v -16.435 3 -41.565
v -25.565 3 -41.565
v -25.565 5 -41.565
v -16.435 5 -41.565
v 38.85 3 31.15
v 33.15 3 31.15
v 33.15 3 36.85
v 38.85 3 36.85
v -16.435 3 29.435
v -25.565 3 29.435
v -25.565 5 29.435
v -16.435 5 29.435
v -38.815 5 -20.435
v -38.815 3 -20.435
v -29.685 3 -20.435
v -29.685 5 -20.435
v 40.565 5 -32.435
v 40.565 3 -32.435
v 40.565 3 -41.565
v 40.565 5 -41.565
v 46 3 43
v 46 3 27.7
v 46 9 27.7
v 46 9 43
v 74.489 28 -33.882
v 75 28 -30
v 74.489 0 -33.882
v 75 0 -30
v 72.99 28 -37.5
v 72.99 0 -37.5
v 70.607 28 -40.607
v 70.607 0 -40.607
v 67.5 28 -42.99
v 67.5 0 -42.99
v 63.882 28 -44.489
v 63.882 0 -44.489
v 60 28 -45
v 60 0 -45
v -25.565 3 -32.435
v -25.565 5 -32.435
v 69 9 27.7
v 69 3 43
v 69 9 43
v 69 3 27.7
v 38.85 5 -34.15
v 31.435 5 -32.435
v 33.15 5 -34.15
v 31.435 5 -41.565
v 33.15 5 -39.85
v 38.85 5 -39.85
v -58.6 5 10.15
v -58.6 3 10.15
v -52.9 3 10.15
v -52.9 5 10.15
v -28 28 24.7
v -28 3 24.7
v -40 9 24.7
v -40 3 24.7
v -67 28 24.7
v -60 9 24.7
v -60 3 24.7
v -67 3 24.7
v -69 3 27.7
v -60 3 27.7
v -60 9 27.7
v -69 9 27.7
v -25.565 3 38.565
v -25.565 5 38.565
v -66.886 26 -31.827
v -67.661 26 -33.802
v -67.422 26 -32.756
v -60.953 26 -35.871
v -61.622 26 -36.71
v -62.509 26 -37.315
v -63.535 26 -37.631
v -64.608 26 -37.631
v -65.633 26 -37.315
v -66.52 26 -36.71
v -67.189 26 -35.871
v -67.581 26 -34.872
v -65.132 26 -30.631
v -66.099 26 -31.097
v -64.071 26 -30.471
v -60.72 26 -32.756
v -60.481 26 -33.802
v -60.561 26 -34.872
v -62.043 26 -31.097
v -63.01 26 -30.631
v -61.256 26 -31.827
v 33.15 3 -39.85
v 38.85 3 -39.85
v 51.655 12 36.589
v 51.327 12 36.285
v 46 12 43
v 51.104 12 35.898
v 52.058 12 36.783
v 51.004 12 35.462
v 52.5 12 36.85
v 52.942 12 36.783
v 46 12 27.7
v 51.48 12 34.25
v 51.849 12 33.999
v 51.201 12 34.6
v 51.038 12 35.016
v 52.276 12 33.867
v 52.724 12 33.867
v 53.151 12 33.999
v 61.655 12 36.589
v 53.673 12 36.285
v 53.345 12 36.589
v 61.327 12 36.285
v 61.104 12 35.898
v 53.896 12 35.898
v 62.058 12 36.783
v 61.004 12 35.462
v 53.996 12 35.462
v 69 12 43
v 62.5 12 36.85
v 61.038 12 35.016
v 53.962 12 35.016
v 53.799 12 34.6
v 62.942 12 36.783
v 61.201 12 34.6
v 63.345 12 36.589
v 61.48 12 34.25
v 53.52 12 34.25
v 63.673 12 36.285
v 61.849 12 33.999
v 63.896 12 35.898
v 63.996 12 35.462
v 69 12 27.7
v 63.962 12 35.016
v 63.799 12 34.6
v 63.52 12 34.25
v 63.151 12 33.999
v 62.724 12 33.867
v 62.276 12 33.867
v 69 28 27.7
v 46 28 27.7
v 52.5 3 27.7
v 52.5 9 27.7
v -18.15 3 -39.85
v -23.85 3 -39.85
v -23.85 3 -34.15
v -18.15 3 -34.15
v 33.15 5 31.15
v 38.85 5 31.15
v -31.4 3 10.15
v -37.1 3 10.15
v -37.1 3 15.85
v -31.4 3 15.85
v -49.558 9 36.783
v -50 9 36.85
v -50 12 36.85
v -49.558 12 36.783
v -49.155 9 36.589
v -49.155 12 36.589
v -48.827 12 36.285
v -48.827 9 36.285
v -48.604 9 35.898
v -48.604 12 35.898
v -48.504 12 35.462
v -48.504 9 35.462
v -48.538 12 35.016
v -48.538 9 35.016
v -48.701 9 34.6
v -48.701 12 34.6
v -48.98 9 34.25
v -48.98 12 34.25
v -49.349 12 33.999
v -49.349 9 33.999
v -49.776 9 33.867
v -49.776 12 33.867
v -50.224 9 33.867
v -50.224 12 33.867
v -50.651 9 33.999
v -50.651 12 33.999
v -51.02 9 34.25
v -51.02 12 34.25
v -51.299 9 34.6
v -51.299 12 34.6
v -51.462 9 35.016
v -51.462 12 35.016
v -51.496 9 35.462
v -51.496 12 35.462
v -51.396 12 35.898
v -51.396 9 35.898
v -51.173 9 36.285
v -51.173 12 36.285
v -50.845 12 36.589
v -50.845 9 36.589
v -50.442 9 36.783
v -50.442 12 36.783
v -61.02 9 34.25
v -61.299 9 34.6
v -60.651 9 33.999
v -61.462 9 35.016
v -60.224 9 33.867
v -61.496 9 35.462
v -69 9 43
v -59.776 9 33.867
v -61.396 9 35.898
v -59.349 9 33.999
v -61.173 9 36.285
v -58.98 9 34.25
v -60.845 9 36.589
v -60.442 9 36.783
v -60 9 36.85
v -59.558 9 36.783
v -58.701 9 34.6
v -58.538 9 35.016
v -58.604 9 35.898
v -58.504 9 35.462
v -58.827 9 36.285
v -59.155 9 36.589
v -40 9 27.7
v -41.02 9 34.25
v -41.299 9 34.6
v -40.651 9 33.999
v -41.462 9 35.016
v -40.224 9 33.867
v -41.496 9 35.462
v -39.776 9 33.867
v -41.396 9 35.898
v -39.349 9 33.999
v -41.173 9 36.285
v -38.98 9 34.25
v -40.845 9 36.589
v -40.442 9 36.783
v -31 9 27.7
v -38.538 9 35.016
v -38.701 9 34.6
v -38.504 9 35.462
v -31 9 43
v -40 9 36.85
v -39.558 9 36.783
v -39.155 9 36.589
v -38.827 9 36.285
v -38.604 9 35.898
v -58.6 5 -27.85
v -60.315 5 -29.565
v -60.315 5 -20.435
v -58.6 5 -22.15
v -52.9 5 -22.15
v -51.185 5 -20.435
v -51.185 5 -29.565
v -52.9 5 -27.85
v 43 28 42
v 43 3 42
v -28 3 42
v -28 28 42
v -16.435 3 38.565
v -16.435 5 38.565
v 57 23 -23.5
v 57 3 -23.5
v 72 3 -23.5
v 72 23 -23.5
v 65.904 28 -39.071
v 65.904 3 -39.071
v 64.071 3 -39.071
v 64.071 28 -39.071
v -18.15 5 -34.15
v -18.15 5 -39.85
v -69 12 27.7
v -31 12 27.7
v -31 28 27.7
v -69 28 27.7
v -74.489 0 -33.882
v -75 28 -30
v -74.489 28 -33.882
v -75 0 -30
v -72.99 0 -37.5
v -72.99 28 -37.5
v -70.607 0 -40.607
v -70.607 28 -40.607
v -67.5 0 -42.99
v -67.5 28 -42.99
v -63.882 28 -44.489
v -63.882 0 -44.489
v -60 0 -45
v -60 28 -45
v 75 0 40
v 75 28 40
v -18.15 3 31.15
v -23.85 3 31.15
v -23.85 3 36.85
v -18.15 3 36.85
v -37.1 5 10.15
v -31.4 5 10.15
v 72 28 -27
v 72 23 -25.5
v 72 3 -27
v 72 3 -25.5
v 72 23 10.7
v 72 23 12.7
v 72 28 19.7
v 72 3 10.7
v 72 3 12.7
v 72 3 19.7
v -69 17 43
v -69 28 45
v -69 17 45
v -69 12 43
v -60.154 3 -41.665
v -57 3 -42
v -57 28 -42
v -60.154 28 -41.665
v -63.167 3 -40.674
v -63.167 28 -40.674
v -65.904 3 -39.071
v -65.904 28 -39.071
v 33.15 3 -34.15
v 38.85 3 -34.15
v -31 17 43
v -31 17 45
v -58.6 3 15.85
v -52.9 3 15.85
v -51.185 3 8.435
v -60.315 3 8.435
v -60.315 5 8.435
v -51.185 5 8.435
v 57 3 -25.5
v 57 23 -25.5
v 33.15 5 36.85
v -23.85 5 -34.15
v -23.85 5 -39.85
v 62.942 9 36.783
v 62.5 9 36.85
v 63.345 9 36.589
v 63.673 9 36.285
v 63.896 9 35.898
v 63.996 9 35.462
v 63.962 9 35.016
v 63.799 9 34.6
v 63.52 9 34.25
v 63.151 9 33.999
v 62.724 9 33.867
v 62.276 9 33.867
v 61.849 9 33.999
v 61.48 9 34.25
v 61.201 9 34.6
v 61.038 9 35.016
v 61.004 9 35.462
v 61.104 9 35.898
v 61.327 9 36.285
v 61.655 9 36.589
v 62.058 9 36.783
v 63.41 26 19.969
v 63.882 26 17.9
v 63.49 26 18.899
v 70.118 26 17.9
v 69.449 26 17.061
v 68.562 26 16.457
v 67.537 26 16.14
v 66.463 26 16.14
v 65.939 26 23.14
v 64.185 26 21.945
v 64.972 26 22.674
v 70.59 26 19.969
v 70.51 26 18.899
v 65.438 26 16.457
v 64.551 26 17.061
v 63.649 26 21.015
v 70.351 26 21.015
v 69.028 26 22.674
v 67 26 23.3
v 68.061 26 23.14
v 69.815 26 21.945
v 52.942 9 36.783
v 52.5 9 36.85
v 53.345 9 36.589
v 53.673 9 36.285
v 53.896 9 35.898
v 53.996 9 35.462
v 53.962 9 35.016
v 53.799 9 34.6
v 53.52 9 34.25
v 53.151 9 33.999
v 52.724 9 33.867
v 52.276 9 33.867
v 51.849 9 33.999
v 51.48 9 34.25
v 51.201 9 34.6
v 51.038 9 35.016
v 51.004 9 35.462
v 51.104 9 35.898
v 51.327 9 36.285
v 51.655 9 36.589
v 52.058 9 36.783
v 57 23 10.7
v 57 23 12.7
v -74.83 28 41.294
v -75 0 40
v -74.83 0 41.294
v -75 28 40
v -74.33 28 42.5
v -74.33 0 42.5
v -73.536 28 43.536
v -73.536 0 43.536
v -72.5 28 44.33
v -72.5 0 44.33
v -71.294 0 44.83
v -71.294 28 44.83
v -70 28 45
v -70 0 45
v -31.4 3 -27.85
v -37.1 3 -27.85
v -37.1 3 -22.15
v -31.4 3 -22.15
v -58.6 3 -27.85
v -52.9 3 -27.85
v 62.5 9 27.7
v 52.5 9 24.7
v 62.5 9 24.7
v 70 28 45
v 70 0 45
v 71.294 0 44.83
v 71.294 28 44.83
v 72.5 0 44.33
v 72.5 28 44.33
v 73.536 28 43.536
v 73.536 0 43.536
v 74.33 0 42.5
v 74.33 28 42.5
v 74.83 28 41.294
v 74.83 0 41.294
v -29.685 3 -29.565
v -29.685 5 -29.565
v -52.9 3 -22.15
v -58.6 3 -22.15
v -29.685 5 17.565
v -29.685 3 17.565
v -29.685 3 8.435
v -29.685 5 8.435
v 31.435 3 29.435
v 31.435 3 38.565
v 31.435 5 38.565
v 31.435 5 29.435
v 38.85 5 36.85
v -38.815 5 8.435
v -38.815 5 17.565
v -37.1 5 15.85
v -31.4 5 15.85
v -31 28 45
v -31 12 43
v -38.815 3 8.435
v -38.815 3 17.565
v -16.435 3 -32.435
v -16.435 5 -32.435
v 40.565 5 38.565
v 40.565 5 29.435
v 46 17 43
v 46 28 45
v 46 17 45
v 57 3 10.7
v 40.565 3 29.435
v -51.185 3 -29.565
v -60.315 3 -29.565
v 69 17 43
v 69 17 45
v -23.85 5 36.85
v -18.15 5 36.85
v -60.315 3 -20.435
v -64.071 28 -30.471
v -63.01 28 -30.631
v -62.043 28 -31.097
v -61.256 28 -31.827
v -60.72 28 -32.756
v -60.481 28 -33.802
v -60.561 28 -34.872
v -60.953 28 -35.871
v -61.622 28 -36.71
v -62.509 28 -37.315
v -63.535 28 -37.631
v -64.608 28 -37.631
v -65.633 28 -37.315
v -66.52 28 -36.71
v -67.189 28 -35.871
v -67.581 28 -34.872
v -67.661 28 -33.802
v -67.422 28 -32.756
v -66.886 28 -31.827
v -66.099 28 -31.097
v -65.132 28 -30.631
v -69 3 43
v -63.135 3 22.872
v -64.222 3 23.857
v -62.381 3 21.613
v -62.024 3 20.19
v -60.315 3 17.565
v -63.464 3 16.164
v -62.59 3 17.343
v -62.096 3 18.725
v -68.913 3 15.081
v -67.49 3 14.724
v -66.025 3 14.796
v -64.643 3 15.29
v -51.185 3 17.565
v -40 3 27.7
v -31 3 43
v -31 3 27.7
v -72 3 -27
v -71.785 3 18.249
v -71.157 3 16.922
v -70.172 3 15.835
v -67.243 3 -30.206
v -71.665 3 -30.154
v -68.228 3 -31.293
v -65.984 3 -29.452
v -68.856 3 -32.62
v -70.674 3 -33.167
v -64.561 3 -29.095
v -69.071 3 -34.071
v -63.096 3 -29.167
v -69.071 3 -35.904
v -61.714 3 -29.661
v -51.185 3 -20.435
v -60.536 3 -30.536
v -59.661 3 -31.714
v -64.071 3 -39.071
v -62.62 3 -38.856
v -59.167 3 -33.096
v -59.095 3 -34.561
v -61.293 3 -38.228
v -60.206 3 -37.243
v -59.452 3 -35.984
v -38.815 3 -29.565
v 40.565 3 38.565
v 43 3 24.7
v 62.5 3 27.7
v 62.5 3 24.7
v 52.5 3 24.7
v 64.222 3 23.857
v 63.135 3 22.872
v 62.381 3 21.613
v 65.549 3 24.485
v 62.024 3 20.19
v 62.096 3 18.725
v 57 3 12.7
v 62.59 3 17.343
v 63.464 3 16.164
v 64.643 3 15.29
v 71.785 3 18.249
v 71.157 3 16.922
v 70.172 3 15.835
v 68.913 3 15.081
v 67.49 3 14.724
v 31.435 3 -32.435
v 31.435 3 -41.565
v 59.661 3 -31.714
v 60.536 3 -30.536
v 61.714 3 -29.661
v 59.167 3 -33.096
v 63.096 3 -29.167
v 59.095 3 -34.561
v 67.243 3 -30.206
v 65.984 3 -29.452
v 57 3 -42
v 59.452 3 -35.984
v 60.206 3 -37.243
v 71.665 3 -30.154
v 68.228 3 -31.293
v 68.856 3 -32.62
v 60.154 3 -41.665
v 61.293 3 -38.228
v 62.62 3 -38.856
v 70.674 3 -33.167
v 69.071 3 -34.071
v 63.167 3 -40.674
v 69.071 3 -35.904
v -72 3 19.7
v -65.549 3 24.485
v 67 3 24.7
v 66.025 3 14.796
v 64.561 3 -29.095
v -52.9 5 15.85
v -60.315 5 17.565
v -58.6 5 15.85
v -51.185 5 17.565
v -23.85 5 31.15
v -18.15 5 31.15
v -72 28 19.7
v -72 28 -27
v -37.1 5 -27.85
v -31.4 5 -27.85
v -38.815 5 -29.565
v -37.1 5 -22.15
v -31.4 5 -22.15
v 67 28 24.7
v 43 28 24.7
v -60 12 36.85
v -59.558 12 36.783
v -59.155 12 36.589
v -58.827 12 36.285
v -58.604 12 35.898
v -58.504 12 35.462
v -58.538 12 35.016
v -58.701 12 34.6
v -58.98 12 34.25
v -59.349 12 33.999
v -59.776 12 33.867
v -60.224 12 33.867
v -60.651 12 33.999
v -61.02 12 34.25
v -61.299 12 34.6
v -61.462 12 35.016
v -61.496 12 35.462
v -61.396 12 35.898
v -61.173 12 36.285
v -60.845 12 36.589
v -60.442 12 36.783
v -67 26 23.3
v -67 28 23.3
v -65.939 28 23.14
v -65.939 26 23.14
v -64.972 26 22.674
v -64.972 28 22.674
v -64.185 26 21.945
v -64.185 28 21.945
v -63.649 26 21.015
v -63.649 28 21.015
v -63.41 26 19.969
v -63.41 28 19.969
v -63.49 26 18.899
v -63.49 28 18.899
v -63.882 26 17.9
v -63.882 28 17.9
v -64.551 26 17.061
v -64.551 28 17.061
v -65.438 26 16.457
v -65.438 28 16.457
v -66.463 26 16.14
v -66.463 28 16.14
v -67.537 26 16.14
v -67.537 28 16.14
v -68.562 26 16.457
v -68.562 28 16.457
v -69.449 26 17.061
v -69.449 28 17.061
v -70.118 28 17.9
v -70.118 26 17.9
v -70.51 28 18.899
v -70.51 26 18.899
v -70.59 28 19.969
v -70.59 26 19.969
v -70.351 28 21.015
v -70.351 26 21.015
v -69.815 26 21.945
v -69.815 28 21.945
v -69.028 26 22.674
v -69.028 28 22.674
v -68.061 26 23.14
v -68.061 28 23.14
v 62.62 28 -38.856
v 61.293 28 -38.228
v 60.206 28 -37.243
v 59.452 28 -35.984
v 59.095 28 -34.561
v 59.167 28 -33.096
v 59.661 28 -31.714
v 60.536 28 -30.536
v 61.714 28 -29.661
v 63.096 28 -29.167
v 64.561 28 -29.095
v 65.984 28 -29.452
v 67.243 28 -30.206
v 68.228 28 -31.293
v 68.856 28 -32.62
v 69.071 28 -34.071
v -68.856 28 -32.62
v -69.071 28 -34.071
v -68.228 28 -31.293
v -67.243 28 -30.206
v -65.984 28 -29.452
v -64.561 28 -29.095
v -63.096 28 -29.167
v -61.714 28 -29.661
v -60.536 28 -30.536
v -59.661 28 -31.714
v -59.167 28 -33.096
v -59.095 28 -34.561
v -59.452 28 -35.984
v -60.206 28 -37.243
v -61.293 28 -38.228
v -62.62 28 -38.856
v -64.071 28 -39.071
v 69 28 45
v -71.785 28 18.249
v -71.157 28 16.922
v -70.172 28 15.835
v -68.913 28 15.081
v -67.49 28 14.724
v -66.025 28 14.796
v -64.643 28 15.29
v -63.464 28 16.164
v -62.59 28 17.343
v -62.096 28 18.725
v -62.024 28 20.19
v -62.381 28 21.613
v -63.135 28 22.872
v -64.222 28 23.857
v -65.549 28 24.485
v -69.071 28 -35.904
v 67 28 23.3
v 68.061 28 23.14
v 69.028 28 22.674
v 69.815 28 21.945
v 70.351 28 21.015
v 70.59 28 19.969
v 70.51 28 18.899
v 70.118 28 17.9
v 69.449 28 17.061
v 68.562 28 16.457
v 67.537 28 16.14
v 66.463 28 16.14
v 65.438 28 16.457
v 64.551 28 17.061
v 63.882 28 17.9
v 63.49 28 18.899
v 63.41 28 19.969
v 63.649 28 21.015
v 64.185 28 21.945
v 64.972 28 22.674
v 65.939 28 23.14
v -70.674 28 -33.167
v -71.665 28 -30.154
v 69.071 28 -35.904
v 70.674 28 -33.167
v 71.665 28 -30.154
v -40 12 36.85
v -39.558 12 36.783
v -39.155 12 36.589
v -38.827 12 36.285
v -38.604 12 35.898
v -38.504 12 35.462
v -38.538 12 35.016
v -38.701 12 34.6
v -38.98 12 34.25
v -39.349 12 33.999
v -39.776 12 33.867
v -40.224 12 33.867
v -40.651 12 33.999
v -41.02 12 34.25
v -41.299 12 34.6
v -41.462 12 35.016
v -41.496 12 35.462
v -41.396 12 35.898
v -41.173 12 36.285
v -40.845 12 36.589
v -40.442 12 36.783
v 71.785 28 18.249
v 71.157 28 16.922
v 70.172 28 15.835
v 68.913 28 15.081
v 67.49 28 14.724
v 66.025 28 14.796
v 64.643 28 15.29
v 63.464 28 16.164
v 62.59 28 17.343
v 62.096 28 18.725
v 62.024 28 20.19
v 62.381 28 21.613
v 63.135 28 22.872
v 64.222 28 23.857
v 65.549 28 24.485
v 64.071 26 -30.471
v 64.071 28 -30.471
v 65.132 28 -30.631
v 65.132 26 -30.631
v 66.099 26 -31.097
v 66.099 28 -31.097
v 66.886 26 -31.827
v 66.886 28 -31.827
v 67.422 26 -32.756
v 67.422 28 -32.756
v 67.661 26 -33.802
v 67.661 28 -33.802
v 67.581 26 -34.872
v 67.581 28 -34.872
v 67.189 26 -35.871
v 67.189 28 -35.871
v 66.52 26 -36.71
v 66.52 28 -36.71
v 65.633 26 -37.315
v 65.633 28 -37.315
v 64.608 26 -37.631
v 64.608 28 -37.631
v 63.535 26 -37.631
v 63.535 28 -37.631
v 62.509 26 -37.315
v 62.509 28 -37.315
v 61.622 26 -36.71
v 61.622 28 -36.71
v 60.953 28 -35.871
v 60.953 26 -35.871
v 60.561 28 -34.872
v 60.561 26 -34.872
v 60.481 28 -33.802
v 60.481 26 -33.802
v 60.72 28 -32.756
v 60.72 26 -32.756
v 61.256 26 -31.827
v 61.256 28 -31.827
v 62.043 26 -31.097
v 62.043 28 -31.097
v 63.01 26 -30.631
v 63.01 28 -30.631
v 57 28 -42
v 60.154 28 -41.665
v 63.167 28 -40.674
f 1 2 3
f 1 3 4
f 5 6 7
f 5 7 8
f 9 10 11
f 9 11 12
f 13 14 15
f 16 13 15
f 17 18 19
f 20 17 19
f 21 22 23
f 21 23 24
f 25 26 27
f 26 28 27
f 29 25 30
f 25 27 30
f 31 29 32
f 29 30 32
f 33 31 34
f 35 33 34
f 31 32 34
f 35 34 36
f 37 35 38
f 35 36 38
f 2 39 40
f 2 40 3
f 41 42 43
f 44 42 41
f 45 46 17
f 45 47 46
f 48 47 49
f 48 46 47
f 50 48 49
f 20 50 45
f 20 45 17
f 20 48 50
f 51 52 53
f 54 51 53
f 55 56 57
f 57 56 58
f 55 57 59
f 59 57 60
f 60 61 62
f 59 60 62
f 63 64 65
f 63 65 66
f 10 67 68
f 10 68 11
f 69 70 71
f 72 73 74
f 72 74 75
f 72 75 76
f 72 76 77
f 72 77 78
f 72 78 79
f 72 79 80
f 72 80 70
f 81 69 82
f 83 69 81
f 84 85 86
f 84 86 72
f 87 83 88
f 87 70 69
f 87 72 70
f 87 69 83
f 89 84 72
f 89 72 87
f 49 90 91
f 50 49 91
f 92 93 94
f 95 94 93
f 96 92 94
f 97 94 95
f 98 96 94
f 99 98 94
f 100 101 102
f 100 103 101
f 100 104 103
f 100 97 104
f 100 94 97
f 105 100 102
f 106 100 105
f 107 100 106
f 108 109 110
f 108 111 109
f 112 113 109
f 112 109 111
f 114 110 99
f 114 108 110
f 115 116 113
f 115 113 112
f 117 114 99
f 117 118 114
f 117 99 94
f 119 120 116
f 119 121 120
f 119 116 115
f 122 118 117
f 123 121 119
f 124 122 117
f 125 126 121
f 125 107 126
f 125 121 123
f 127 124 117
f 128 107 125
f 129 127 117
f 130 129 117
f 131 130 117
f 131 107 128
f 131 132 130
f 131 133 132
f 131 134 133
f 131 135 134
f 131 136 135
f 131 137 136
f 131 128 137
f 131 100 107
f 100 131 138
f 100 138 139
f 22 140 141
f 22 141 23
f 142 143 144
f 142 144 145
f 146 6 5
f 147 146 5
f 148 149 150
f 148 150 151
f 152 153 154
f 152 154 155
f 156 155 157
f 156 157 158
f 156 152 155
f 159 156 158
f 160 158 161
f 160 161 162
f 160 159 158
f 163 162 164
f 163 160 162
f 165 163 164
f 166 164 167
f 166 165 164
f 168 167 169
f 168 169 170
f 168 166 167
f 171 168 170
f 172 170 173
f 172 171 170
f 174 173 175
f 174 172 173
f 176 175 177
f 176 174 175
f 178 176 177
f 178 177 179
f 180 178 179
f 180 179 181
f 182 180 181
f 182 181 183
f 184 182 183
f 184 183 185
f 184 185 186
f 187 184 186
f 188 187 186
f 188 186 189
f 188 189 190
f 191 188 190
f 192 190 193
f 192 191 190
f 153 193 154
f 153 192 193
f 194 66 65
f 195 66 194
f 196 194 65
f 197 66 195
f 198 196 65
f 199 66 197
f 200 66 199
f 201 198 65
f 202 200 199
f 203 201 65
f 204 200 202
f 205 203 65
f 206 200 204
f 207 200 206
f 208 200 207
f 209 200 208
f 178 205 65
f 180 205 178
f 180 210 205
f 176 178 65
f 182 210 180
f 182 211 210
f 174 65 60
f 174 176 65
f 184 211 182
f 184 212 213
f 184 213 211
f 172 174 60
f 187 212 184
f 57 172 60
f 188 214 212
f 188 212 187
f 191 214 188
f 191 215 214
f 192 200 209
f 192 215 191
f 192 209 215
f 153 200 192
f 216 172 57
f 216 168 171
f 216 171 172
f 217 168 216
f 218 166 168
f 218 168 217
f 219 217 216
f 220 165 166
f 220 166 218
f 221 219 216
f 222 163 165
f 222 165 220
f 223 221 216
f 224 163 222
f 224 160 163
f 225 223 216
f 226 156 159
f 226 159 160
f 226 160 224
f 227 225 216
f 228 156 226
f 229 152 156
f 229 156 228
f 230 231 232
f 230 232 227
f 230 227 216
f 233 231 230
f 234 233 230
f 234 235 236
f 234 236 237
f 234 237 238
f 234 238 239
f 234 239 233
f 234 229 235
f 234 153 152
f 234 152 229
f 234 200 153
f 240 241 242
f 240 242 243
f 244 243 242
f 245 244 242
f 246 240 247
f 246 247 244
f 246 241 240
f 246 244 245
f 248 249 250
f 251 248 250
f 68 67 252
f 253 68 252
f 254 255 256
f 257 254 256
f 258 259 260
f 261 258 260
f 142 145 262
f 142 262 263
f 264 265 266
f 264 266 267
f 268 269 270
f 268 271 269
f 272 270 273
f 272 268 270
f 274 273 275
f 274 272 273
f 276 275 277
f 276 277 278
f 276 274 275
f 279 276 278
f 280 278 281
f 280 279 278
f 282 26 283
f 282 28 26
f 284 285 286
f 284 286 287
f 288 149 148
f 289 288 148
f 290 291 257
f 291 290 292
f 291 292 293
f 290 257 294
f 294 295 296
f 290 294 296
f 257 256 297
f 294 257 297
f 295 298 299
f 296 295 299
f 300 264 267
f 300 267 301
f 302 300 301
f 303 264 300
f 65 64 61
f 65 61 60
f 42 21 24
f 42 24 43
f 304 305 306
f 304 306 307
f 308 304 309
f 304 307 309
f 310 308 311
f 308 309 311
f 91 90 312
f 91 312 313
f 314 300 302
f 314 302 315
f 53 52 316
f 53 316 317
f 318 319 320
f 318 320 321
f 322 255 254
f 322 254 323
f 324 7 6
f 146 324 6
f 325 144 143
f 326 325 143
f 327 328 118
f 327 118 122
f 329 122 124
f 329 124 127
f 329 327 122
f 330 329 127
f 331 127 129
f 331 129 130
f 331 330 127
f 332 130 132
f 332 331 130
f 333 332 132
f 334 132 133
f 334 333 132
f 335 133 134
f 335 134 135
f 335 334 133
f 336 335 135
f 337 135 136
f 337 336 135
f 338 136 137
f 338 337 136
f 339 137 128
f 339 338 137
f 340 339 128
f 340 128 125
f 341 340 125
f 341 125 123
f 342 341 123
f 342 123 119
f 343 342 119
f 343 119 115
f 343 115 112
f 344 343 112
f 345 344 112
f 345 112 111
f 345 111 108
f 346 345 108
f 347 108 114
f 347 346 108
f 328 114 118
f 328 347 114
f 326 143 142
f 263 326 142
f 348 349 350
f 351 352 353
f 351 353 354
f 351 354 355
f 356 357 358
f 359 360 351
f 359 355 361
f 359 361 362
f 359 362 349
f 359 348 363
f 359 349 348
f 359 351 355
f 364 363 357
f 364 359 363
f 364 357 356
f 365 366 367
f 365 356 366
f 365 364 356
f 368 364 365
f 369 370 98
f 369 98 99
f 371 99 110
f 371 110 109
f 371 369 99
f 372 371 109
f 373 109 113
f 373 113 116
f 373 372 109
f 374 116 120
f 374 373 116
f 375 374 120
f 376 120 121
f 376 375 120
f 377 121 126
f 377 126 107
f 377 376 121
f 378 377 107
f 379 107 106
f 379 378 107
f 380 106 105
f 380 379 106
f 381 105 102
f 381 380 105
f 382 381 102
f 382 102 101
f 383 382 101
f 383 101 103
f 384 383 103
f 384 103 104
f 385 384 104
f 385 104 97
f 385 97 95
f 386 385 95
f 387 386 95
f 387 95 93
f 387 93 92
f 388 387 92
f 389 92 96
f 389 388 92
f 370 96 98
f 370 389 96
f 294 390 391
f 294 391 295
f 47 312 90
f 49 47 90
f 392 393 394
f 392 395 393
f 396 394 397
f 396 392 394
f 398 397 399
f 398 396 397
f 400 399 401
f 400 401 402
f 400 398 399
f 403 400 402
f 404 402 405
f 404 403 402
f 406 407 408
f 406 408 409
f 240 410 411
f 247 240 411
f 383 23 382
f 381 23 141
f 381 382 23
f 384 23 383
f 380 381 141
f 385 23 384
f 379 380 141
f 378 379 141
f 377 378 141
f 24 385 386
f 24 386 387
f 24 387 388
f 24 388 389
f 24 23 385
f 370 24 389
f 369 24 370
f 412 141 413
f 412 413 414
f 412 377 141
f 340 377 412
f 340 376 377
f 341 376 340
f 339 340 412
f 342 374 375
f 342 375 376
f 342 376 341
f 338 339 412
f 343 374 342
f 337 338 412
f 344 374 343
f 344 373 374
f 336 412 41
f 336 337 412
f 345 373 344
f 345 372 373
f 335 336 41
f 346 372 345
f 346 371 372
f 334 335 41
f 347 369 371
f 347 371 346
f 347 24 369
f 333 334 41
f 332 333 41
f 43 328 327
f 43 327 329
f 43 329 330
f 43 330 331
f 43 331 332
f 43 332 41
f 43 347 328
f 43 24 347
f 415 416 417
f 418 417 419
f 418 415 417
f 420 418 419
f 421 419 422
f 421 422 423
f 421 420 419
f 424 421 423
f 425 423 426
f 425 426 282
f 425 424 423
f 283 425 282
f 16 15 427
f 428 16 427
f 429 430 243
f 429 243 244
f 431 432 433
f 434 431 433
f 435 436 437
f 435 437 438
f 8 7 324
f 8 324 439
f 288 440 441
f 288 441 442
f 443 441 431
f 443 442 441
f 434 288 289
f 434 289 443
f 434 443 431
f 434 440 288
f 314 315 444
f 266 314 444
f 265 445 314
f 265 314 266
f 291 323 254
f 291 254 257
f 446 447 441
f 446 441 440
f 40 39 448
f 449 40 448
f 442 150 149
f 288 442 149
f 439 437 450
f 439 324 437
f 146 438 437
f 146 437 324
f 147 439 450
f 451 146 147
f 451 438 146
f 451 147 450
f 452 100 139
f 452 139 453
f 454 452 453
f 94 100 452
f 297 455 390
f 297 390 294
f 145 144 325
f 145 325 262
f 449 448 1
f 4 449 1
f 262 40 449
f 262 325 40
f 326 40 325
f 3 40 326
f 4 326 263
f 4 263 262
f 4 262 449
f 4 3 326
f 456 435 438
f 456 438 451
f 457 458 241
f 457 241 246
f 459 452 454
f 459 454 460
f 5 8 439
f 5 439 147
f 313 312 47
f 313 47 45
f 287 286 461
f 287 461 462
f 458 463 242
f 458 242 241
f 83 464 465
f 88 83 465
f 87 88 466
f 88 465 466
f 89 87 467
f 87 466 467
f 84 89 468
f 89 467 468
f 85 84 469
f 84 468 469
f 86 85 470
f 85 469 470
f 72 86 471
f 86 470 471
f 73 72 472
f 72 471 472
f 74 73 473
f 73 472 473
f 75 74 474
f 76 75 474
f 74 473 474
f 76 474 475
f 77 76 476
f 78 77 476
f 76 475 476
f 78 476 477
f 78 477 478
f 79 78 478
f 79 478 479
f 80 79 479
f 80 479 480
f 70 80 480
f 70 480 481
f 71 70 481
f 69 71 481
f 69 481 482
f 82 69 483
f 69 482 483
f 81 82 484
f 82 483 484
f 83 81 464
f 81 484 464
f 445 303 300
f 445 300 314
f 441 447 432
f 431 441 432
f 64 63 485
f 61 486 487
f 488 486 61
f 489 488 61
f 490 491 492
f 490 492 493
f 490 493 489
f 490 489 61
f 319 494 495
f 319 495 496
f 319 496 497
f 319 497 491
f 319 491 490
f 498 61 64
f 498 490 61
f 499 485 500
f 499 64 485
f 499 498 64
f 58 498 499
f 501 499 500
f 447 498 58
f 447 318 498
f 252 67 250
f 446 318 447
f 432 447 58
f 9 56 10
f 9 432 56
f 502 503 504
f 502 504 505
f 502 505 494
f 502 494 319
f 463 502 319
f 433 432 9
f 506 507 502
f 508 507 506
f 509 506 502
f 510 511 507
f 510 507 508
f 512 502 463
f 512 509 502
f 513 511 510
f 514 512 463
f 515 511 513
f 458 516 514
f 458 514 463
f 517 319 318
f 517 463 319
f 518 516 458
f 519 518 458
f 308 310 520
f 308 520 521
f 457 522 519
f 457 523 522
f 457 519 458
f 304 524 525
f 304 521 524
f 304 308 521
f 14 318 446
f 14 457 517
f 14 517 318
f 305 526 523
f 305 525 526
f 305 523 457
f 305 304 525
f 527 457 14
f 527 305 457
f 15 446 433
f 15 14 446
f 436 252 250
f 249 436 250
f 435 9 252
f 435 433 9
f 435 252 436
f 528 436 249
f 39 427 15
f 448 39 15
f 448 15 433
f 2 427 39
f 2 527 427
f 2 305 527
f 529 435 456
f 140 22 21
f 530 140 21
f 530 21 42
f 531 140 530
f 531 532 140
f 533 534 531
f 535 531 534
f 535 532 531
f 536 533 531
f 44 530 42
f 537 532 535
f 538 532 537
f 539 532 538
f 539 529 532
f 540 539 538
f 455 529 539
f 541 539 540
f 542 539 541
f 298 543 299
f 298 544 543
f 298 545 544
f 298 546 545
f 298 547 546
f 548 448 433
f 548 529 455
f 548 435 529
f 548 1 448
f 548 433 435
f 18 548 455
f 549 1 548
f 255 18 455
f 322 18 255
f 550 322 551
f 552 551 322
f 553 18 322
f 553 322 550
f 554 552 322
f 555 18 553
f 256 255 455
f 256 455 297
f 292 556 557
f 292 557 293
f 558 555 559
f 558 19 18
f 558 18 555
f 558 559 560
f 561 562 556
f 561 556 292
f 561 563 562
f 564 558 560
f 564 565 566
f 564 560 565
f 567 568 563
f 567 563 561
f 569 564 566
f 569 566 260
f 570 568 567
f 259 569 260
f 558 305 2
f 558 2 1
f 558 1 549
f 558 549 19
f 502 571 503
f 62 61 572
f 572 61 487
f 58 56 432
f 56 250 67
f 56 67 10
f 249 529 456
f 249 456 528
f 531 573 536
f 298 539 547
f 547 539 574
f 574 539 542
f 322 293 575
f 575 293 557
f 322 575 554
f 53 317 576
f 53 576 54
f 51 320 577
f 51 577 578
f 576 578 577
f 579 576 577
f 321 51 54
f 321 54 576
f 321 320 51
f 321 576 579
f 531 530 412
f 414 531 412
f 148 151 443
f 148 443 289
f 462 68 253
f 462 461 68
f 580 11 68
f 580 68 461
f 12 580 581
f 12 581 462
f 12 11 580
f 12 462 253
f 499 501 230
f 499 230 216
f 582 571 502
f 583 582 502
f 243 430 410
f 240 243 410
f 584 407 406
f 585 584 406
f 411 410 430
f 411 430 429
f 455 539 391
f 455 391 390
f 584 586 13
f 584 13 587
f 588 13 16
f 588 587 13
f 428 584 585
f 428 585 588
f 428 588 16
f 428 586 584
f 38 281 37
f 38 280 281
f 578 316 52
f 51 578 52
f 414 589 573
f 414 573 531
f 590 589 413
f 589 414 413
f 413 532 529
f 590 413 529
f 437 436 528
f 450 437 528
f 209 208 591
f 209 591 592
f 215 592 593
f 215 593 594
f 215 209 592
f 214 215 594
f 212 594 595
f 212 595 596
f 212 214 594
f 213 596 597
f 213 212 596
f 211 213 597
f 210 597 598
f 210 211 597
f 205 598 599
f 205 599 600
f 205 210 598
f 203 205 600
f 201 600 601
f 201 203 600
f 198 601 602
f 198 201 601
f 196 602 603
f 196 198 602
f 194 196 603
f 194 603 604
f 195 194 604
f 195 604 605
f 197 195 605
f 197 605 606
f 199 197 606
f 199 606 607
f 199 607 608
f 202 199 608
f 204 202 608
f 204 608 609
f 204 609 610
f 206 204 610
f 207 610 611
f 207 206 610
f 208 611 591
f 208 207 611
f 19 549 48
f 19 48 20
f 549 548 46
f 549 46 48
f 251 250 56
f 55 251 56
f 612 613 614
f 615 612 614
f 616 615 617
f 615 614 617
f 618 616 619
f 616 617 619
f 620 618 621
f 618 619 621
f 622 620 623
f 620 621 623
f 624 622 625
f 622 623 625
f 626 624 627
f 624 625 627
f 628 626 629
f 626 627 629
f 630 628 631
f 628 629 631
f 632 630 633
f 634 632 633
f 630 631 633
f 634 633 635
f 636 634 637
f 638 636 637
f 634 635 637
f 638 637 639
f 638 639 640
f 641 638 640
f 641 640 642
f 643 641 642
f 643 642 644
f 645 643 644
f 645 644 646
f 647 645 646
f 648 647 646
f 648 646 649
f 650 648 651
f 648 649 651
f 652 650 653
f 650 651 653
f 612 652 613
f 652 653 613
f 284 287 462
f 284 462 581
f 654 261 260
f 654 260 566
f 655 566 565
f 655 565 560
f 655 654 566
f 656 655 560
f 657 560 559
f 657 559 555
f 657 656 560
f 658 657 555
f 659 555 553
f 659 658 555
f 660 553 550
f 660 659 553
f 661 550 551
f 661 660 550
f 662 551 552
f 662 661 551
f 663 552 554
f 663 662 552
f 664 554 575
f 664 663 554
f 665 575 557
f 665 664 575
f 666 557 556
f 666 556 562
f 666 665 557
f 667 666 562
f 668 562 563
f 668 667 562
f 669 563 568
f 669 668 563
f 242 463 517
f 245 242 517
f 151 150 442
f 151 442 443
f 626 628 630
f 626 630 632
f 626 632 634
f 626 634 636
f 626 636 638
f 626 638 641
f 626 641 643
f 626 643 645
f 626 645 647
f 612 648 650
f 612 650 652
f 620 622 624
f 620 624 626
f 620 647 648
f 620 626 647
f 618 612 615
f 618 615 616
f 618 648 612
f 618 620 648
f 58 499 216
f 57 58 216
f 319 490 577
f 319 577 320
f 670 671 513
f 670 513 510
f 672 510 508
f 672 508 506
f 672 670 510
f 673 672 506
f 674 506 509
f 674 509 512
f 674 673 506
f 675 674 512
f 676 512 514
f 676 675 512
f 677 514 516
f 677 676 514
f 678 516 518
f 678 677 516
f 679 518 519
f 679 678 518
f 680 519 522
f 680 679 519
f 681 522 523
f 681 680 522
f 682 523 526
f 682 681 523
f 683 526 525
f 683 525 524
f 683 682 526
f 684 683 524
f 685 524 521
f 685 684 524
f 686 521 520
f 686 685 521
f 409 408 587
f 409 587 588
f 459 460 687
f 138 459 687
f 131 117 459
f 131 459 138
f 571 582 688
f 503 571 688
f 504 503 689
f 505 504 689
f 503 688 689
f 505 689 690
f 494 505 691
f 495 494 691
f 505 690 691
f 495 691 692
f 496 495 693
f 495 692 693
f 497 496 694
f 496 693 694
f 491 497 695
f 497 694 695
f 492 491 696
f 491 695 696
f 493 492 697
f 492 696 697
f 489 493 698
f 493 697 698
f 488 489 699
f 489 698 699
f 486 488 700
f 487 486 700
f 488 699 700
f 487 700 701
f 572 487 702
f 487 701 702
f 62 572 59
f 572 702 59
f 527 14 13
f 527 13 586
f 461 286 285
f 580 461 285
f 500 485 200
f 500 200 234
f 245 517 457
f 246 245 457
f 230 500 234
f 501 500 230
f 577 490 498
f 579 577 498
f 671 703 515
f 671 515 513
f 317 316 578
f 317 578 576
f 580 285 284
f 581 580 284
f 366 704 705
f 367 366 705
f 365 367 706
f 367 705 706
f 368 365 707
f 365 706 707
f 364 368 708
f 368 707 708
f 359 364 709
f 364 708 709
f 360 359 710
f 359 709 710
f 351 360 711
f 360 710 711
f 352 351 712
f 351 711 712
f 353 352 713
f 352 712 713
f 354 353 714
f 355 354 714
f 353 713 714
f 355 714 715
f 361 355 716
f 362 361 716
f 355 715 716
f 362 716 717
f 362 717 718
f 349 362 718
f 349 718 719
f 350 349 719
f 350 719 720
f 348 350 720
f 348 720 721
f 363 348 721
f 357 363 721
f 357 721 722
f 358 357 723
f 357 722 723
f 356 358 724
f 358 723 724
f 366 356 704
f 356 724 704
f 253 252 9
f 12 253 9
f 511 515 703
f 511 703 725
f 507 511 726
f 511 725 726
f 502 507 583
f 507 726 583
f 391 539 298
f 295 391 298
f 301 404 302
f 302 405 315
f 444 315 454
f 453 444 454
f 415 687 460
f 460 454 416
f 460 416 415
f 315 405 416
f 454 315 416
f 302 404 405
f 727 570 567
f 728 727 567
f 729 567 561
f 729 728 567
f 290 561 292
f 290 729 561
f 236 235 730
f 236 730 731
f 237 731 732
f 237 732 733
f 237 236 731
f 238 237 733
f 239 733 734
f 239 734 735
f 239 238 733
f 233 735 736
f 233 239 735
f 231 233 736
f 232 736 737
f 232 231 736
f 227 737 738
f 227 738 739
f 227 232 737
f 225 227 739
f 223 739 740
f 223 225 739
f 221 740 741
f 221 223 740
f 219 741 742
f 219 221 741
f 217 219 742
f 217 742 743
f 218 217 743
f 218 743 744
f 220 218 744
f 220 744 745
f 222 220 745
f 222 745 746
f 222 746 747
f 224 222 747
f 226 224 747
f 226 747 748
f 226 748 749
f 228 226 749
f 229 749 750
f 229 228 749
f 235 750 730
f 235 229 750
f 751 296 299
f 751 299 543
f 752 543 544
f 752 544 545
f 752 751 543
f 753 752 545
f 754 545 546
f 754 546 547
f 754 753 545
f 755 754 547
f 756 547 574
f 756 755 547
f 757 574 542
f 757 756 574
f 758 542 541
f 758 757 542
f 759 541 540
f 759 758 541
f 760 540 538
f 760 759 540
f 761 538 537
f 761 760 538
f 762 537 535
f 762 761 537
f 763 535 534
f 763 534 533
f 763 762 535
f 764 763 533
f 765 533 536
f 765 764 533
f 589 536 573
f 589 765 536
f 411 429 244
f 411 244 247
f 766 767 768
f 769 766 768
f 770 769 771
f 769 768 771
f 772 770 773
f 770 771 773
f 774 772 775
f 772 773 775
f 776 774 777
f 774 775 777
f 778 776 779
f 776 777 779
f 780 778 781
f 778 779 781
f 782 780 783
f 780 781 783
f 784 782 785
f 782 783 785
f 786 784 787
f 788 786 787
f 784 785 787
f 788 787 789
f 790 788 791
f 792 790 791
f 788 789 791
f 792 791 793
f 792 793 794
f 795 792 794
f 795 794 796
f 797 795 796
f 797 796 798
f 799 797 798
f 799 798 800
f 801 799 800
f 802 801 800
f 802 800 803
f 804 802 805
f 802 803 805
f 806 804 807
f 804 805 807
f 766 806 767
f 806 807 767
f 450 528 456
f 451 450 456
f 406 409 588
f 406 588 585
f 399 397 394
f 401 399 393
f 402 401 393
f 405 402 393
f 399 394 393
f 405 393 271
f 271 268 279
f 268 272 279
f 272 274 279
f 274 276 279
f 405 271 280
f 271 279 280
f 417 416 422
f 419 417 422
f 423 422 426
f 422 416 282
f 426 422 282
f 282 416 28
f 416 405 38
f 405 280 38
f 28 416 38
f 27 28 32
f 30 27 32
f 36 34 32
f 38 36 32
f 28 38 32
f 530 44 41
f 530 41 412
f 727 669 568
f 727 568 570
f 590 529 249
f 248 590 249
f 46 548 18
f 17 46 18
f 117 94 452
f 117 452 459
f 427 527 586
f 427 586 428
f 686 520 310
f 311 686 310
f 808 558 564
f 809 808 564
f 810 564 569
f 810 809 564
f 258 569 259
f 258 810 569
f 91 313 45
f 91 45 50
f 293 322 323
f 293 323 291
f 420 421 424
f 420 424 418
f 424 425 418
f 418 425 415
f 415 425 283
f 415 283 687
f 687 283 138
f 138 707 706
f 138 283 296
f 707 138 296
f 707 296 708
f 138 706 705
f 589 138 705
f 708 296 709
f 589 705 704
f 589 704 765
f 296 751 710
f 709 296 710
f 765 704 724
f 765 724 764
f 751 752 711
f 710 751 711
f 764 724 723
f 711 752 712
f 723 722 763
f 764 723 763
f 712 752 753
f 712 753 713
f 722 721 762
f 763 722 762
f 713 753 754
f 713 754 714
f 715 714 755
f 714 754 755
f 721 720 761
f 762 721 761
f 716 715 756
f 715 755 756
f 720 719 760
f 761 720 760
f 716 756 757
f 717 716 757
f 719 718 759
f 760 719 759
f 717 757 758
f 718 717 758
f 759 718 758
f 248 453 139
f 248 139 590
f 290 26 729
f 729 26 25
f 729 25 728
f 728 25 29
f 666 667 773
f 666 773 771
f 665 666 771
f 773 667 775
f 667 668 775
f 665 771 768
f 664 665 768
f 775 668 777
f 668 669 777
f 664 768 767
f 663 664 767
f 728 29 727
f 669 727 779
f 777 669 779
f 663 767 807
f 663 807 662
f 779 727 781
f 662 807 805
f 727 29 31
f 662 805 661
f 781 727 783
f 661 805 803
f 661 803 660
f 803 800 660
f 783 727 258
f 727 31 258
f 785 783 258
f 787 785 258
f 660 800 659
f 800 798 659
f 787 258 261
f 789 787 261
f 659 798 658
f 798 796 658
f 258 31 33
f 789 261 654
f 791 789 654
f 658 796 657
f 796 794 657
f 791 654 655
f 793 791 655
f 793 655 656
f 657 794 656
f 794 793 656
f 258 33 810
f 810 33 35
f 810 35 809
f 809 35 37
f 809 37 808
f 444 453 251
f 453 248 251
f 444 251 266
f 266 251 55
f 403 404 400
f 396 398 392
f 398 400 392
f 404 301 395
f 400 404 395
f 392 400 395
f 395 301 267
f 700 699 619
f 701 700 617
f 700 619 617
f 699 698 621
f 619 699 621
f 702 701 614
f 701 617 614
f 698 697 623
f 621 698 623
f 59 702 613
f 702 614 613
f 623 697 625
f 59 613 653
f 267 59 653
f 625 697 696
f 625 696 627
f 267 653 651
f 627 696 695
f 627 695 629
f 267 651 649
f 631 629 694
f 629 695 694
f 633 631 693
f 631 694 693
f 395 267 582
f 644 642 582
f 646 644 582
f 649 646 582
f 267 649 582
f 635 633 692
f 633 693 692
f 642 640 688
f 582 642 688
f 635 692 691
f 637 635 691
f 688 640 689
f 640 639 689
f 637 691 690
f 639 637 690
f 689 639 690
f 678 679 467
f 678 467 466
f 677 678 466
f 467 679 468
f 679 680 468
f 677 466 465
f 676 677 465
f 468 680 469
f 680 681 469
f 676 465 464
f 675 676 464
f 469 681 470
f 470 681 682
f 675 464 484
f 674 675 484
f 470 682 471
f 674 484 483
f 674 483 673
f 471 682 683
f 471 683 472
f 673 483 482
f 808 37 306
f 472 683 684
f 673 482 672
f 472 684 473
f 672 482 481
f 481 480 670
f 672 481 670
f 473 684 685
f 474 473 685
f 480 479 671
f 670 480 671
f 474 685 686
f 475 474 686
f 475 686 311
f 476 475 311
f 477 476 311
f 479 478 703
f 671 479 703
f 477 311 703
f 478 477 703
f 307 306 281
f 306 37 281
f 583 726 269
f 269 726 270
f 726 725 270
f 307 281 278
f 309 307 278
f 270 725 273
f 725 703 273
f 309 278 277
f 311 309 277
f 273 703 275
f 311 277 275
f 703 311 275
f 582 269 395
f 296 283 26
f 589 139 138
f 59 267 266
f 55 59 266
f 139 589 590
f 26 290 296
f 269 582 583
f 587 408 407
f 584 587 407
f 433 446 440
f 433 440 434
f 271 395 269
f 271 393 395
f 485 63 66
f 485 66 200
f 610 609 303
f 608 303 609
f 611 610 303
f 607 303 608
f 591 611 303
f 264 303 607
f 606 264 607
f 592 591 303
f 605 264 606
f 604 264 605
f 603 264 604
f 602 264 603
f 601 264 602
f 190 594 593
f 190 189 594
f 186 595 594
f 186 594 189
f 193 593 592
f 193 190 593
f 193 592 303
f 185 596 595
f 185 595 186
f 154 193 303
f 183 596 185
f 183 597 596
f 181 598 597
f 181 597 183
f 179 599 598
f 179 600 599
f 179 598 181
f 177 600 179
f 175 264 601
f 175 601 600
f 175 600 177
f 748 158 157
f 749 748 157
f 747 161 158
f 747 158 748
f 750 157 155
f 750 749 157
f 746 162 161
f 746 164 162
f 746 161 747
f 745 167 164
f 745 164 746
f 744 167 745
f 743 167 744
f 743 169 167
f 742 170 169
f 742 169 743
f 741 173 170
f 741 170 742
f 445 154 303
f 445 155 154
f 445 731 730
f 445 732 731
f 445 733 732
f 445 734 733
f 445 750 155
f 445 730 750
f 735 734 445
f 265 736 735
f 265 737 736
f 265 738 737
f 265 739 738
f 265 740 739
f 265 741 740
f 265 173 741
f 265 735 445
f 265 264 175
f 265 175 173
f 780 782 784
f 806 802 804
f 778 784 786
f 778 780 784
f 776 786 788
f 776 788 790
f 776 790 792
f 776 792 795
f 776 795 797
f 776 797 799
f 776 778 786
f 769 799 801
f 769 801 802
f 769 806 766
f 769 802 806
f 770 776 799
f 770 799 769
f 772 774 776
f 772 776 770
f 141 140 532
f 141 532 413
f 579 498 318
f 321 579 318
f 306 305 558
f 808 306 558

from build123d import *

# Parameters (mm, degrees)
CROQUIS1_W              = 150
CROQUIS1_H              = 90
SALIENTE_EXTRUIR1_DEPTH = 3
SALIENTE_EXTRUIR2_DEPTH = 25
CROQUIS3_W              = 38
CROQUIS3_H              = 2
CROQUIS3_W_2            = 23
SALIENTE_EXTRUIR3_DEPTH = 14
SALIENTE_EXTRUIR4_START = 6
CROQUIS4_W              = 38
CROQUIS4_H              = 15.3
CROQUIS4_R              = 1.5
CROQUIS4_W_2            = 23
SALIENTE_EXTRUIR4_DEPTH = 3
CORTAR_EXTRUIR1_REACH   = 110.14
CROQUIS5_W              = 20
CROQUIS5_H              = 6
CROQUIS5_W_2            = 10
REDONDEO1_R             = 15
REDONDEO2_R             = 5
SALIENTE_EXTRUIR5_START = 25
SALIENTE_EXTRUIR5_DEPTH = 25
CROQUIS7_R              = 3.6
CORTAR_EXTRUIR2_DEPTH   = 2
CROQUIS8_W              = 9.129710912
CROQUIS8_H              = 9.129710912
CROQUIS8_W_2            = 5.7
CROQUIS8_H_2            = 5.7
SALIENTE_EXTRUIR6_DEPTH = 2
CROQUIS9_W              = 15
CROQUIS9_H              = 2
SALIENTE_EXTRUIR7_DEPTH = 20


with BuildPart() as part:
    # Croquis1 → Saliente-Extruir1 (new body)
    with BuildSketch(Plane(origin=(0, 0, 0), x_dir=(1, 0, 0), z_dir=(0, 1, 0))):
        Rectangle(CROQUIS1_W, CROQUIS1_H)
    extrude(amount=SALIENTE_EXTRUIR1_DEPTH)

    # Croquis2 → Saliente-Extruir2 (add)
    with BuildSketch(Plane(origin=(0, 3, 0), x_dir=(1, 0, 0), z_dir=(0, 1, 0))):
        Polygon((-75, -45), (-75, 45), (75, 45), (75, -45), (69, -45), (69, -27.7), (46, -27.7), (46, -45), (-31, -45), (-31, -27.7), (-69, -27.7), (-69, -45), align=None)
        Polygon((-72, 42), (72, 42), (72, -24.7), (43, -24.7), (43, -42), (-28, -42), (-28, -24.7), (-72, -24.7), align=None, mode=Mode.SUBTRACT)
    extrude(amount=SALIENTE_EXTRUIR2_DEPTH)

    # Croquis3 → Saliente-Extruir3 (add)
    with BuildSketch(Plane(origin=(0, 3, 0), x_dir=(1, 0, 0), z_dir=(0, 1, 0))):
        with Locations((-50, -44)):
            Rectangle(CROQUIS3_W, CROQUIS3_H)
        with Locations((57.5, -44)):
            Rectangle(CROQUIS3_W_2, CROQUIS3_H)
    extrude(amount=SALIENTE_EXTRUIR3_DEPTH)

    # Croquis4 → Saliente-Extruir4 (add)
    # profile 1 of 2: a face of its own
    with BuildSketch(Plane(origin=(0, 3, 0), x_dir=(1, 0, 0), z_dir=(0, 1, 0)).offset(SALIENTE_EXTRUIR4_START)):
        with Locations((-50, -35.35)):
            Rectangle(CROQUIS4_W, CROQUIS4_H)
        with Locations(Location((-50, -35.35, 0), (0, 0, 270))):
            Circle(CROQUIS4_R, mode=Mode.SUBTRACT)
        with Locations(Location((-40, -35.35, 0), (0, 0, 270))):
            Circle(CROQUIS4_R, mode=Mode.SUBTRACT)
        with Locations(Location((-60, -35.35, 0), (0, 0, 270))):
            Circle(CROQUIS4_R, mode=Mode.SUBTRACT)
    # profile 2 of 2: a face of its own
    with BuildSketch(Plane(origin=(0, 3, 0), x_dir=(1, 0, 0), z_dir=(0, 1, 0)).offset(SALIENTE_EXTRUIR4_START)):
        with Locations((57.5, -35.35)):
            Rectangle(CROQUIS4_W_2, CROQUIS4_H)
        with Locations(Location((62.5, -35.35, 0), (0, 0, 270))):
            Circle(CROQUIS4_R, mode=Mode.SUBTRACT)
        with Locations(Location((52.5, -35.35, 0), (0, 0, 270))):
            Circle(CROQUIS4_R, mode=Mode.SUBTRACT)
    extrude(amount=SALIENTE_EXTRUIR4_DEPTH)

    # Croquis5 → Cortar-Extruir1 (cut, up to next)
    with BuildSketch(Plane.XY.offset(27.7), mode=Mode.PRIVATE) as cortar_extruir1_sk1:
        with Locations((-50, 6)):
            Rectangle(CROQUIS5_W, CROQUIS5_H)
    cortar_extruir1_tool1 = extrude(cortar_extruir1_sk1.sketch, amount=-CORTAR_EXTRUIR1_REACH, mode=Mode.PRIVATE) & part.part
    # Croquis5 → Cortar-Extruir1 (cut, up to next)
    with BuildSketch(Plane.XY.offset(27.7), mode=Mode.PRIVATE) as cortar_extruir1_sk2:
        with Locations((57.5, 6)):
            Rectangle(CROQUIS5_W_2, CROQUIS5_H)
    cortar_extruir1_tool2 = extrude(cortar_extruir1_sk2.sketch, amount=-CORTAR_EXTRUIR1_REACH, mode=Mode.PRIVATE) & part.part
    add(cortar_extruir1_tool1.solids().sort_by_distance((-50, 6, 27.7))[0], mode=Mode.SUBTRACT)
    add(cortar_extruir1_tool2.solids().sort_by_distance((57.5, 6, 27.7))[0], mode=Mode.SUBTRACT)

    # Redondeo1
    redondeo1_edges = [part.edges().sort_by_distance(p)[0] for p in [
        (72, 15.5, -42),
        (-72, 15.5, -42),
        (-75, 14, -45),
        (75, 14, -45),
    ]]
    fillet(redondeo1_edges, radius=REDONDEO1_R)

    # Redondeo2
    redondeo2_edges = [part.edges().sort_by_distance(p)[0] for p in [
        (75, 14, 45),
        (-75, 14, 45),
    ]]
    fillet(redondeo2_edges, radius=REDONDEO2_R)

    # Croquis6 → Saliente-Extruir5 (add)
    with BuildSketch(Plane(origin=(0, 3, 0), x_dir=(1, 0, 0), z_dir=(0, 1, 0)).offset(SALIENTE_EXTRUIR5_START)):
        with BuildLine():
            Line((-64.071067812, 39.071067812), (-65.90445517, 39.071067812))
            ThreePointArc((-65.90445517, 39.071067812), (-67.606601718, 37.606601718), (-69.071067812, 35.90445517))
            Line((-69.071067812, 35.90445517), (-69.071067812, 34.071067812))
            ThreePointArc((-69.071067812, 34.071067812), (-60.535533906, 30.535533906), (-64.071067812, 39.071067812))
        make_face()
        with BuildLine():
            Line((-67, -24.7), (-72, -24.7))
            Line((-72, -24.7), (-72, -19.7))
            ThreePointArc((-72, -19.7), (-63.464466094, -16.164466094), (-67, -24.7))
        make_face()
        with BuildLine():
            Line((72, -24.7), (72, -19.7))
            ThreePointArc((72, -19.7), (63.464466094, -16.164466094), (67, -24.7))
            Line((67, -24.7), (72, -24.7))
        make_face()
        with BuildLine():
            Line((69.071067812, 34.071067812), (69.071067812, 35.90445517))
            ThreePointArc((69.071067812, 35.90445517), (67.606601718, 37.606601718), (65.90445517, 39.071067812))
            Line((65.90445517, 39.071067812), (64.071067812, 39.071067812))
            ThreePointArc((64.071067812, 39.071067812), (60.535533906, 30.535533906), (69.071067812, 34.071067812))
        make_face()
    extrude(amount=-SALIENTE_EXTRUIR5_DEPTH)

    # Croquis7 → Cortar-Extruir2 (cut)
    with BuildSketch(Plane(origin=(0, 28, 0), x_dir=(1, 0, 0), z_dir=(0, 1, 0))):
        with Locations(Location((-64.071067812, 34.071067812, 0), (0, 0, 270))):
            Circle(CROQUIS7_R)
        with Locations(Location((64.071067812, 34.071067812, 0), (0, 0, 270))):
            Circle(CROQUIS7_R)
        with Locations(Location((67, -19.7, 0), (0, 0, 270))):
            Circle(CROQUIS7_R)
        with Locations(Location((-67, -19.7, 0), (0, 0, 270))):
            Circle(CROQUIS7_R)
    extrude(amount=-CORTAR_EXTRUIR2_DEPTH, mode=Mode.SUBTRACT)

    # Croquis8 → Saliente-Extruir6 (add)
    # profile 1 of 8: a face of its own
    with BuildSketch(Plane(origin=(0, 3, 0), x_dir=(1, 0, 0), z_dir=(0, 1, 0))):
        with Locations((-34.25, 25)):
            Rectangle(CROQUIS8_W, CROQUIS8_H)
        with Locations((-34.25, 25)):
            Rectangle(CROQUIS8_W_2, CROQUIS8_H_2, mode=Mode.SUBTRACT)
    # profile 2 of 8: a face of its own
    with BuildSketch(Plane(origin=(0, 3, 0), x_dir=(1, 0, 0), z_dir=(0, 1, 0))):
        with Locations((-55.75, 25)):
            Rectangle(CROQUIS8_W, CROQUIS8_H)
        with Locations((-55.75, 25)):
            Rectangle(CROQUIS8_W_2, CROQUIS8_H_2, mode=Mode.SUBTRACT)
    # profile 3 of 8: a face of its own
    with BuildSketch(Plane(origin=(0, 3, 0), x_dir=(1, 0, 0), z_dir=(0, 1, 0))):
        with Locations((-34.25, -13)):
            Rectangle(CROQUIS8_W, CROQUIS8_H)
        with Locations((-34.25, -13)):
            Rectangle(CROQUIS8_W_2, CROQUIS8_H_2, mode=Mode.SUBTRACT)
    # profile 4 of 8: a face of its own
    with BuildSketch(Plane(origin=(0, 3, 0), x_dir=(1, 0, 0), z_dir=(0, 1, 0))):
        with Locations((-55.75, -13)):
            Rectangle(CROQUIS8_W, CROQUIS8_H)
        with Locations((-55.75, -13)):
            Rectangle(CROQUIS8_W_2, CROQUIS8_H_2, mode=Mode.SUBTRACT)
    # profile 5 of 8: a face of its own
    with BuildSketch(Plane(origin=(0, 3, 0), x_dir=(1, 0, 0), z_dir=(0, 1, 0))):
        with Locations((36, 37)):
            Rectangle(CROQUIS8_W, CROQUIS8_H)
        with Locations((36, 37)):
            Rectangle(CROQUIS8_W_2, CROQUIS8_H_2, mode=Mode.SUBTRACT)
    # profile 6 of 8: a face of its own
    with BuildSketch(Plane(origin=(0, 3, 0), x_dir=(1, 0, 0), z_dir=(0, 1, 0))):
        with Locations((-21, 37)):
            Rectangle(CROQUIS8_W, CROQUIS8_H)
        with Locations((-21, 37)):
            Rectangle(CROQUIS8_W_2, CROQUIS8_H_2, mode=Mode.SUBTRACT)
    # profile 7 of 8: a face of its own
    with BuildSketch(Plane(origin=(0, 3, 0), x_dir=(1, 0, 0), z_dir=(0, 1, 0))):
        with Locations((-21, -34)):
            Rectangle(CROQUIS8_W, CROQUIS8_H)
        with Locations((-21, -34)):
            Rectangle(CROQUIS8_W_2, CROQUIS8_H_2, mode=Mode.SUBTRACT)
    # profile 8 of 8: a face of its own
    with BuildSketch(Plane(origin=(0, 3, 0), x_dir=(1, 0, 0), z_dir=(0, 1, 0))):
        with Locations((36, -34)):
            Rectangle(CROQUIS8_W, CROQUIS8_H)
        with Locations((36, -34)):
            Rectangle(CROQUIS8_W_2, CROQUIS8_H_2, mode=Mode.SUBTRACT)
    extrude(amount=SALIENTE_EXTRUIR6_DEPTH)

    # Croquis9 → Saliente-Extruir7 (add)
    with BuildSketch(Plane(origin=(0, 3, 0), x_dir=(1, 0, 0), z_dir=(0, 1, 0))):
        with Locations((64.5, -11.7)):
            Rectangle(CROQUIS9_W, CROQUIS9_H)
        with Locations((64.5, 24.5)):
            Rectangle(CROQUIS9_W, CROQUIS9_H)
    extrude(amount=SALIENTE_EXTRUIR7_DEPTH)


solid = part.part
